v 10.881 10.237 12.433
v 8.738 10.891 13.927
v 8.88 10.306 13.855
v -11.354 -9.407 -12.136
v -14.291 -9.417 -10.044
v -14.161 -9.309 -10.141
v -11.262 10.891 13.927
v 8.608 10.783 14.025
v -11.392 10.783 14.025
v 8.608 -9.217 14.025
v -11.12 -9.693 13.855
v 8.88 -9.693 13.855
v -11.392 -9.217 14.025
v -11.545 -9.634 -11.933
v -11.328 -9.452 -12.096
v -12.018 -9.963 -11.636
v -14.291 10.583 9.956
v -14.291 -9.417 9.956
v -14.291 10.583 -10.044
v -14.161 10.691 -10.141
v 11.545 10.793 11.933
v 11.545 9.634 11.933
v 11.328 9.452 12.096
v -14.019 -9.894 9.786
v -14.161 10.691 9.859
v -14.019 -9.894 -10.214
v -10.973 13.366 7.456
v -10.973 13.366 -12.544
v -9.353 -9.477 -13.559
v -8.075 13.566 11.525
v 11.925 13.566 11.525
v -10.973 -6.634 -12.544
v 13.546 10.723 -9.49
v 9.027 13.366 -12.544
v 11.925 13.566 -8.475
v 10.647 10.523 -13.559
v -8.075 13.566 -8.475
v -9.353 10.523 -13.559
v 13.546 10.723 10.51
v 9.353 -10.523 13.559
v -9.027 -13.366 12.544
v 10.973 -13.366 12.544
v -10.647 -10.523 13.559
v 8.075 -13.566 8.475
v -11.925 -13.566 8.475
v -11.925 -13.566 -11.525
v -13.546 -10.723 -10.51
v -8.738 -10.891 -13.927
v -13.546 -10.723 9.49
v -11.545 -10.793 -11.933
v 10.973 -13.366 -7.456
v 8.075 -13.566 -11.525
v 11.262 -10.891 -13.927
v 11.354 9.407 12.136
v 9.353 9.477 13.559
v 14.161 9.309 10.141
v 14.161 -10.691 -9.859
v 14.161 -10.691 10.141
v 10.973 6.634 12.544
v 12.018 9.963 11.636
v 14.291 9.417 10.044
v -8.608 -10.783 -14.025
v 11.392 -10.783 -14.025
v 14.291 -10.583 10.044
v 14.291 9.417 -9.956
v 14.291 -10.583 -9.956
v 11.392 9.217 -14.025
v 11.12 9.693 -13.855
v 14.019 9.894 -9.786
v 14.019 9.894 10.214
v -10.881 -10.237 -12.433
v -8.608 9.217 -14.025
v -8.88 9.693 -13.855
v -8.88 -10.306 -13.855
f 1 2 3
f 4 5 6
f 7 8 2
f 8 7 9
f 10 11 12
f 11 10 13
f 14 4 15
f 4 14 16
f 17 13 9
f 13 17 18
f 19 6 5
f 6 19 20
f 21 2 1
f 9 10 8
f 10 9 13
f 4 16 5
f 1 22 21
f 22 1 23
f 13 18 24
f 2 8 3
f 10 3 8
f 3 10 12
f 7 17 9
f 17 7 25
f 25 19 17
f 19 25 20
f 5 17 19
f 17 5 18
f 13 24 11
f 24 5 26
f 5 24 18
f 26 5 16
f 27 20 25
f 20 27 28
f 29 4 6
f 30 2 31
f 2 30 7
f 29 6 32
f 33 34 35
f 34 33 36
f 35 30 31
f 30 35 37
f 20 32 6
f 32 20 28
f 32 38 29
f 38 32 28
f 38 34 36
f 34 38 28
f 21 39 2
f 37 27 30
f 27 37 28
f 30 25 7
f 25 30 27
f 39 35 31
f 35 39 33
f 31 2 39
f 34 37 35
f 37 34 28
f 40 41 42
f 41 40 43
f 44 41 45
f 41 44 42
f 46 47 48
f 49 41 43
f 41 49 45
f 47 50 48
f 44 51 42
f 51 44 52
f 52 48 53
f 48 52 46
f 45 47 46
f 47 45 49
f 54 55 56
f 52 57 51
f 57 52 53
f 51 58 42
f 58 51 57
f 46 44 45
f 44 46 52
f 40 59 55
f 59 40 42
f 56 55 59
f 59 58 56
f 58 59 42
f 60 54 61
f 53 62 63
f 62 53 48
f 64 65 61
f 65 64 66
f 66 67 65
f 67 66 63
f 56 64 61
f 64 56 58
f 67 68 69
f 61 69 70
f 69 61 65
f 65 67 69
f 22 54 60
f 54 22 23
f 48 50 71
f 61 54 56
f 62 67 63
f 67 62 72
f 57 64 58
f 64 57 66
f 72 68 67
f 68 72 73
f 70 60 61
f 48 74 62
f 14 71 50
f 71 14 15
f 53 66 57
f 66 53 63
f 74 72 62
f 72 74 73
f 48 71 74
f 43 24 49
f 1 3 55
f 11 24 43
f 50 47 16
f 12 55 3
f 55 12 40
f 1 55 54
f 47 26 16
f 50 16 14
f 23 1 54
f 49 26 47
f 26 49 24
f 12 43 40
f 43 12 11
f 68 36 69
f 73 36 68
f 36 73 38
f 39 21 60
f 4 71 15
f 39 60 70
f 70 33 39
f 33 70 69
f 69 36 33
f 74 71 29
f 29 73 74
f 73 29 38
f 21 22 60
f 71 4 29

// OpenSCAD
minkowski() {
 cube(20, center=true);
 rotate([20, 30, 40])
   difference() {
     cube(5, center=true);
     cube([1, 1, 10], center=true);
   }
}
